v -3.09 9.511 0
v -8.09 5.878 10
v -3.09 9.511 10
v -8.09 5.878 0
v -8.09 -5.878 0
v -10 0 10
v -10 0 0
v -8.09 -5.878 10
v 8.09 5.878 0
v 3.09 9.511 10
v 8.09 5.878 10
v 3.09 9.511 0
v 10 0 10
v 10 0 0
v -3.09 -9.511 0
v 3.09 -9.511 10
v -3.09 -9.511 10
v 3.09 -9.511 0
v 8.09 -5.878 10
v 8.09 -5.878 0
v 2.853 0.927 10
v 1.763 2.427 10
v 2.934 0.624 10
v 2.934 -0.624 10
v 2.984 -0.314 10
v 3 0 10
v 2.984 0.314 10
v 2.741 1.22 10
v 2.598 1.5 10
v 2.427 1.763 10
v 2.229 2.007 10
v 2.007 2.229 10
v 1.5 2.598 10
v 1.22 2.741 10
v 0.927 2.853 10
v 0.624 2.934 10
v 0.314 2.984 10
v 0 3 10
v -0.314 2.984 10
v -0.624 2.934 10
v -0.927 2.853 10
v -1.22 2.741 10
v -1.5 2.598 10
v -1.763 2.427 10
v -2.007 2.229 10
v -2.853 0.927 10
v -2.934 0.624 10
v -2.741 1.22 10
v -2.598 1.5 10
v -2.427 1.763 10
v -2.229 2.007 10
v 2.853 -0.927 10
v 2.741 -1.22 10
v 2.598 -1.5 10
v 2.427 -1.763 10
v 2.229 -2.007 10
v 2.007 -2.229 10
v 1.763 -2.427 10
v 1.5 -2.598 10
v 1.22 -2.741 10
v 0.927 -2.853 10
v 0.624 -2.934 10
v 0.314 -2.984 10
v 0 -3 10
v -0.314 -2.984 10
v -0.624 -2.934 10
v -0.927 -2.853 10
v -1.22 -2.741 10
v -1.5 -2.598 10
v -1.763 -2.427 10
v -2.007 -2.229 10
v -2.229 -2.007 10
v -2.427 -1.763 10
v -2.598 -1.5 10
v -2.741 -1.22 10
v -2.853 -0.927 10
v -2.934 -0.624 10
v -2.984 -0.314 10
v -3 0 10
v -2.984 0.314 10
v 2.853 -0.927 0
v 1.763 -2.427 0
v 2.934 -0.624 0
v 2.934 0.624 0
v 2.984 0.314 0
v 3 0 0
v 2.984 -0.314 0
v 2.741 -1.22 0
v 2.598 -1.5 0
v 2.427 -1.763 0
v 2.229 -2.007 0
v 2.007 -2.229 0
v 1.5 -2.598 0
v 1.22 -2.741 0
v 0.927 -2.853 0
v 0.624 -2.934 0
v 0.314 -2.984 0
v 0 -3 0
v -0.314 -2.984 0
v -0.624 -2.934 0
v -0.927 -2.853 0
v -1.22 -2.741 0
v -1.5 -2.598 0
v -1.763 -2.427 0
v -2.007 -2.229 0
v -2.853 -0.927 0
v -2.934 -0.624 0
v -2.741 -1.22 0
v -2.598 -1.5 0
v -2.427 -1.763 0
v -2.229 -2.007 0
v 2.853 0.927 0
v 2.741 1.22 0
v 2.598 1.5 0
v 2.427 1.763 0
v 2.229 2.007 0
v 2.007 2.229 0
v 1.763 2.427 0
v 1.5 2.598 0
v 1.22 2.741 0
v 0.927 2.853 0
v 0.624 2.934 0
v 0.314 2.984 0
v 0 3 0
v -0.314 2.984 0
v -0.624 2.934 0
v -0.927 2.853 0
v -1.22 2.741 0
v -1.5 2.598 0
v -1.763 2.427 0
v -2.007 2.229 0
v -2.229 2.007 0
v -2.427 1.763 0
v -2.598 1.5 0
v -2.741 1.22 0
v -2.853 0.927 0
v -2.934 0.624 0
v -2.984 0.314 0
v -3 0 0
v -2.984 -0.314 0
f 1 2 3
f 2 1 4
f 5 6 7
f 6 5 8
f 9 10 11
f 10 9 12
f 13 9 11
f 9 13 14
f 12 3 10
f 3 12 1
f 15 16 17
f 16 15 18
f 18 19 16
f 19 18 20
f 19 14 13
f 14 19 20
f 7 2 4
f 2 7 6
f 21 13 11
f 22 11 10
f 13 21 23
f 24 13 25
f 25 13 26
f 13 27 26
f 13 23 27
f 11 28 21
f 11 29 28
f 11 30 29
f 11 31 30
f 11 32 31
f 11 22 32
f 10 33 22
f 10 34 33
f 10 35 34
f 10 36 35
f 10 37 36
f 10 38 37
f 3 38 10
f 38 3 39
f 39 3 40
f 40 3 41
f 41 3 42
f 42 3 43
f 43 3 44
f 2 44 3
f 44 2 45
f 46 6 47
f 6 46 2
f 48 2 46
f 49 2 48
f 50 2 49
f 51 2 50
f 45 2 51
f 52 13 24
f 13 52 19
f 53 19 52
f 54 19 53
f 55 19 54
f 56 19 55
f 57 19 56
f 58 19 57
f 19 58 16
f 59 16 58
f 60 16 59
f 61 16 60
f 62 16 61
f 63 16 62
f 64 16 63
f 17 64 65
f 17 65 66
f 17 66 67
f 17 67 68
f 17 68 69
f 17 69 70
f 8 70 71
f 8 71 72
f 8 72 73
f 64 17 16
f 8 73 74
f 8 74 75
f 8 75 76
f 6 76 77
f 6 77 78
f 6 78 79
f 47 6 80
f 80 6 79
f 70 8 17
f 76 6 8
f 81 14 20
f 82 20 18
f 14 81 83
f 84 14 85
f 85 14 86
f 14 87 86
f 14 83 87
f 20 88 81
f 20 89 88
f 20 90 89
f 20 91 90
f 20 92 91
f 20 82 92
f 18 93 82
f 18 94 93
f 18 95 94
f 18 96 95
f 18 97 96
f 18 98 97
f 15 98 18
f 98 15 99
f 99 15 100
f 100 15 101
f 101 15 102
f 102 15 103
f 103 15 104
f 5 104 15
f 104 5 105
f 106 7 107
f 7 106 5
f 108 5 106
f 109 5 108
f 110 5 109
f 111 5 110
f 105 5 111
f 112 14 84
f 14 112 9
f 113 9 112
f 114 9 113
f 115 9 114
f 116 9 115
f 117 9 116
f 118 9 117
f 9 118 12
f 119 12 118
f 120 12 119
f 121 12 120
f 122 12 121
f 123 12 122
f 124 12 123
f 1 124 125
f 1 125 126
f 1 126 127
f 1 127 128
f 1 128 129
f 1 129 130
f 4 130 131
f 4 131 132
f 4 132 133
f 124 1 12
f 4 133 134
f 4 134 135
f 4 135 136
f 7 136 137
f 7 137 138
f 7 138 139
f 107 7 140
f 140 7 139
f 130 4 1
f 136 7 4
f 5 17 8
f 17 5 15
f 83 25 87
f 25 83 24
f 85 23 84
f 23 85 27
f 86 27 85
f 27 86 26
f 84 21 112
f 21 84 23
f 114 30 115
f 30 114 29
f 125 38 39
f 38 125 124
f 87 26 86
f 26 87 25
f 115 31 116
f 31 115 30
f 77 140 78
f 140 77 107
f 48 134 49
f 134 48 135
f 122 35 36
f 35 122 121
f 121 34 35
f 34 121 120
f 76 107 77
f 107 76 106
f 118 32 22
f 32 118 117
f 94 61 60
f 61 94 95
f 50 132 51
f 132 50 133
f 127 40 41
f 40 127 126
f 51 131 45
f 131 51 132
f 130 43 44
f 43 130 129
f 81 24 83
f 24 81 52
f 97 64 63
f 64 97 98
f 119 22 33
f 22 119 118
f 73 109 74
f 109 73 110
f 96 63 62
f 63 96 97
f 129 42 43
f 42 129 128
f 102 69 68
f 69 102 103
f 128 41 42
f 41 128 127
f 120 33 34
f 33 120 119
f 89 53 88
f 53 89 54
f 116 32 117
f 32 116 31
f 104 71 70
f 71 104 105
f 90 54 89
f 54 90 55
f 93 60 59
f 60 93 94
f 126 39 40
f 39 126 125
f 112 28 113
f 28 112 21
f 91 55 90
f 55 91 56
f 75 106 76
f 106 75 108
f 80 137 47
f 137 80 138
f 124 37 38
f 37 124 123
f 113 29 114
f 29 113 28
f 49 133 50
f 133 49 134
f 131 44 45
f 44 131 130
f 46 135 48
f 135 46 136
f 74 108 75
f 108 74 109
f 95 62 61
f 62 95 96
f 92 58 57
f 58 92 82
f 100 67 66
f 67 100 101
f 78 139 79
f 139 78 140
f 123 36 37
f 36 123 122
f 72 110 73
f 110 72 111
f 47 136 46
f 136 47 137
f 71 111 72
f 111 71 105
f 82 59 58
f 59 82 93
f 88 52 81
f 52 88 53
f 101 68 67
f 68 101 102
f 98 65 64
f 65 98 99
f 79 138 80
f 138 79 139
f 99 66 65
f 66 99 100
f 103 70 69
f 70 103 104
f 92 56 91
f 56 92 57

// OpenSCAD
difference() {
  cylinder(r = 10, h = 10, $fn = 10);
  cylinder(r = 3, h = 10, $fn = 60);
}
